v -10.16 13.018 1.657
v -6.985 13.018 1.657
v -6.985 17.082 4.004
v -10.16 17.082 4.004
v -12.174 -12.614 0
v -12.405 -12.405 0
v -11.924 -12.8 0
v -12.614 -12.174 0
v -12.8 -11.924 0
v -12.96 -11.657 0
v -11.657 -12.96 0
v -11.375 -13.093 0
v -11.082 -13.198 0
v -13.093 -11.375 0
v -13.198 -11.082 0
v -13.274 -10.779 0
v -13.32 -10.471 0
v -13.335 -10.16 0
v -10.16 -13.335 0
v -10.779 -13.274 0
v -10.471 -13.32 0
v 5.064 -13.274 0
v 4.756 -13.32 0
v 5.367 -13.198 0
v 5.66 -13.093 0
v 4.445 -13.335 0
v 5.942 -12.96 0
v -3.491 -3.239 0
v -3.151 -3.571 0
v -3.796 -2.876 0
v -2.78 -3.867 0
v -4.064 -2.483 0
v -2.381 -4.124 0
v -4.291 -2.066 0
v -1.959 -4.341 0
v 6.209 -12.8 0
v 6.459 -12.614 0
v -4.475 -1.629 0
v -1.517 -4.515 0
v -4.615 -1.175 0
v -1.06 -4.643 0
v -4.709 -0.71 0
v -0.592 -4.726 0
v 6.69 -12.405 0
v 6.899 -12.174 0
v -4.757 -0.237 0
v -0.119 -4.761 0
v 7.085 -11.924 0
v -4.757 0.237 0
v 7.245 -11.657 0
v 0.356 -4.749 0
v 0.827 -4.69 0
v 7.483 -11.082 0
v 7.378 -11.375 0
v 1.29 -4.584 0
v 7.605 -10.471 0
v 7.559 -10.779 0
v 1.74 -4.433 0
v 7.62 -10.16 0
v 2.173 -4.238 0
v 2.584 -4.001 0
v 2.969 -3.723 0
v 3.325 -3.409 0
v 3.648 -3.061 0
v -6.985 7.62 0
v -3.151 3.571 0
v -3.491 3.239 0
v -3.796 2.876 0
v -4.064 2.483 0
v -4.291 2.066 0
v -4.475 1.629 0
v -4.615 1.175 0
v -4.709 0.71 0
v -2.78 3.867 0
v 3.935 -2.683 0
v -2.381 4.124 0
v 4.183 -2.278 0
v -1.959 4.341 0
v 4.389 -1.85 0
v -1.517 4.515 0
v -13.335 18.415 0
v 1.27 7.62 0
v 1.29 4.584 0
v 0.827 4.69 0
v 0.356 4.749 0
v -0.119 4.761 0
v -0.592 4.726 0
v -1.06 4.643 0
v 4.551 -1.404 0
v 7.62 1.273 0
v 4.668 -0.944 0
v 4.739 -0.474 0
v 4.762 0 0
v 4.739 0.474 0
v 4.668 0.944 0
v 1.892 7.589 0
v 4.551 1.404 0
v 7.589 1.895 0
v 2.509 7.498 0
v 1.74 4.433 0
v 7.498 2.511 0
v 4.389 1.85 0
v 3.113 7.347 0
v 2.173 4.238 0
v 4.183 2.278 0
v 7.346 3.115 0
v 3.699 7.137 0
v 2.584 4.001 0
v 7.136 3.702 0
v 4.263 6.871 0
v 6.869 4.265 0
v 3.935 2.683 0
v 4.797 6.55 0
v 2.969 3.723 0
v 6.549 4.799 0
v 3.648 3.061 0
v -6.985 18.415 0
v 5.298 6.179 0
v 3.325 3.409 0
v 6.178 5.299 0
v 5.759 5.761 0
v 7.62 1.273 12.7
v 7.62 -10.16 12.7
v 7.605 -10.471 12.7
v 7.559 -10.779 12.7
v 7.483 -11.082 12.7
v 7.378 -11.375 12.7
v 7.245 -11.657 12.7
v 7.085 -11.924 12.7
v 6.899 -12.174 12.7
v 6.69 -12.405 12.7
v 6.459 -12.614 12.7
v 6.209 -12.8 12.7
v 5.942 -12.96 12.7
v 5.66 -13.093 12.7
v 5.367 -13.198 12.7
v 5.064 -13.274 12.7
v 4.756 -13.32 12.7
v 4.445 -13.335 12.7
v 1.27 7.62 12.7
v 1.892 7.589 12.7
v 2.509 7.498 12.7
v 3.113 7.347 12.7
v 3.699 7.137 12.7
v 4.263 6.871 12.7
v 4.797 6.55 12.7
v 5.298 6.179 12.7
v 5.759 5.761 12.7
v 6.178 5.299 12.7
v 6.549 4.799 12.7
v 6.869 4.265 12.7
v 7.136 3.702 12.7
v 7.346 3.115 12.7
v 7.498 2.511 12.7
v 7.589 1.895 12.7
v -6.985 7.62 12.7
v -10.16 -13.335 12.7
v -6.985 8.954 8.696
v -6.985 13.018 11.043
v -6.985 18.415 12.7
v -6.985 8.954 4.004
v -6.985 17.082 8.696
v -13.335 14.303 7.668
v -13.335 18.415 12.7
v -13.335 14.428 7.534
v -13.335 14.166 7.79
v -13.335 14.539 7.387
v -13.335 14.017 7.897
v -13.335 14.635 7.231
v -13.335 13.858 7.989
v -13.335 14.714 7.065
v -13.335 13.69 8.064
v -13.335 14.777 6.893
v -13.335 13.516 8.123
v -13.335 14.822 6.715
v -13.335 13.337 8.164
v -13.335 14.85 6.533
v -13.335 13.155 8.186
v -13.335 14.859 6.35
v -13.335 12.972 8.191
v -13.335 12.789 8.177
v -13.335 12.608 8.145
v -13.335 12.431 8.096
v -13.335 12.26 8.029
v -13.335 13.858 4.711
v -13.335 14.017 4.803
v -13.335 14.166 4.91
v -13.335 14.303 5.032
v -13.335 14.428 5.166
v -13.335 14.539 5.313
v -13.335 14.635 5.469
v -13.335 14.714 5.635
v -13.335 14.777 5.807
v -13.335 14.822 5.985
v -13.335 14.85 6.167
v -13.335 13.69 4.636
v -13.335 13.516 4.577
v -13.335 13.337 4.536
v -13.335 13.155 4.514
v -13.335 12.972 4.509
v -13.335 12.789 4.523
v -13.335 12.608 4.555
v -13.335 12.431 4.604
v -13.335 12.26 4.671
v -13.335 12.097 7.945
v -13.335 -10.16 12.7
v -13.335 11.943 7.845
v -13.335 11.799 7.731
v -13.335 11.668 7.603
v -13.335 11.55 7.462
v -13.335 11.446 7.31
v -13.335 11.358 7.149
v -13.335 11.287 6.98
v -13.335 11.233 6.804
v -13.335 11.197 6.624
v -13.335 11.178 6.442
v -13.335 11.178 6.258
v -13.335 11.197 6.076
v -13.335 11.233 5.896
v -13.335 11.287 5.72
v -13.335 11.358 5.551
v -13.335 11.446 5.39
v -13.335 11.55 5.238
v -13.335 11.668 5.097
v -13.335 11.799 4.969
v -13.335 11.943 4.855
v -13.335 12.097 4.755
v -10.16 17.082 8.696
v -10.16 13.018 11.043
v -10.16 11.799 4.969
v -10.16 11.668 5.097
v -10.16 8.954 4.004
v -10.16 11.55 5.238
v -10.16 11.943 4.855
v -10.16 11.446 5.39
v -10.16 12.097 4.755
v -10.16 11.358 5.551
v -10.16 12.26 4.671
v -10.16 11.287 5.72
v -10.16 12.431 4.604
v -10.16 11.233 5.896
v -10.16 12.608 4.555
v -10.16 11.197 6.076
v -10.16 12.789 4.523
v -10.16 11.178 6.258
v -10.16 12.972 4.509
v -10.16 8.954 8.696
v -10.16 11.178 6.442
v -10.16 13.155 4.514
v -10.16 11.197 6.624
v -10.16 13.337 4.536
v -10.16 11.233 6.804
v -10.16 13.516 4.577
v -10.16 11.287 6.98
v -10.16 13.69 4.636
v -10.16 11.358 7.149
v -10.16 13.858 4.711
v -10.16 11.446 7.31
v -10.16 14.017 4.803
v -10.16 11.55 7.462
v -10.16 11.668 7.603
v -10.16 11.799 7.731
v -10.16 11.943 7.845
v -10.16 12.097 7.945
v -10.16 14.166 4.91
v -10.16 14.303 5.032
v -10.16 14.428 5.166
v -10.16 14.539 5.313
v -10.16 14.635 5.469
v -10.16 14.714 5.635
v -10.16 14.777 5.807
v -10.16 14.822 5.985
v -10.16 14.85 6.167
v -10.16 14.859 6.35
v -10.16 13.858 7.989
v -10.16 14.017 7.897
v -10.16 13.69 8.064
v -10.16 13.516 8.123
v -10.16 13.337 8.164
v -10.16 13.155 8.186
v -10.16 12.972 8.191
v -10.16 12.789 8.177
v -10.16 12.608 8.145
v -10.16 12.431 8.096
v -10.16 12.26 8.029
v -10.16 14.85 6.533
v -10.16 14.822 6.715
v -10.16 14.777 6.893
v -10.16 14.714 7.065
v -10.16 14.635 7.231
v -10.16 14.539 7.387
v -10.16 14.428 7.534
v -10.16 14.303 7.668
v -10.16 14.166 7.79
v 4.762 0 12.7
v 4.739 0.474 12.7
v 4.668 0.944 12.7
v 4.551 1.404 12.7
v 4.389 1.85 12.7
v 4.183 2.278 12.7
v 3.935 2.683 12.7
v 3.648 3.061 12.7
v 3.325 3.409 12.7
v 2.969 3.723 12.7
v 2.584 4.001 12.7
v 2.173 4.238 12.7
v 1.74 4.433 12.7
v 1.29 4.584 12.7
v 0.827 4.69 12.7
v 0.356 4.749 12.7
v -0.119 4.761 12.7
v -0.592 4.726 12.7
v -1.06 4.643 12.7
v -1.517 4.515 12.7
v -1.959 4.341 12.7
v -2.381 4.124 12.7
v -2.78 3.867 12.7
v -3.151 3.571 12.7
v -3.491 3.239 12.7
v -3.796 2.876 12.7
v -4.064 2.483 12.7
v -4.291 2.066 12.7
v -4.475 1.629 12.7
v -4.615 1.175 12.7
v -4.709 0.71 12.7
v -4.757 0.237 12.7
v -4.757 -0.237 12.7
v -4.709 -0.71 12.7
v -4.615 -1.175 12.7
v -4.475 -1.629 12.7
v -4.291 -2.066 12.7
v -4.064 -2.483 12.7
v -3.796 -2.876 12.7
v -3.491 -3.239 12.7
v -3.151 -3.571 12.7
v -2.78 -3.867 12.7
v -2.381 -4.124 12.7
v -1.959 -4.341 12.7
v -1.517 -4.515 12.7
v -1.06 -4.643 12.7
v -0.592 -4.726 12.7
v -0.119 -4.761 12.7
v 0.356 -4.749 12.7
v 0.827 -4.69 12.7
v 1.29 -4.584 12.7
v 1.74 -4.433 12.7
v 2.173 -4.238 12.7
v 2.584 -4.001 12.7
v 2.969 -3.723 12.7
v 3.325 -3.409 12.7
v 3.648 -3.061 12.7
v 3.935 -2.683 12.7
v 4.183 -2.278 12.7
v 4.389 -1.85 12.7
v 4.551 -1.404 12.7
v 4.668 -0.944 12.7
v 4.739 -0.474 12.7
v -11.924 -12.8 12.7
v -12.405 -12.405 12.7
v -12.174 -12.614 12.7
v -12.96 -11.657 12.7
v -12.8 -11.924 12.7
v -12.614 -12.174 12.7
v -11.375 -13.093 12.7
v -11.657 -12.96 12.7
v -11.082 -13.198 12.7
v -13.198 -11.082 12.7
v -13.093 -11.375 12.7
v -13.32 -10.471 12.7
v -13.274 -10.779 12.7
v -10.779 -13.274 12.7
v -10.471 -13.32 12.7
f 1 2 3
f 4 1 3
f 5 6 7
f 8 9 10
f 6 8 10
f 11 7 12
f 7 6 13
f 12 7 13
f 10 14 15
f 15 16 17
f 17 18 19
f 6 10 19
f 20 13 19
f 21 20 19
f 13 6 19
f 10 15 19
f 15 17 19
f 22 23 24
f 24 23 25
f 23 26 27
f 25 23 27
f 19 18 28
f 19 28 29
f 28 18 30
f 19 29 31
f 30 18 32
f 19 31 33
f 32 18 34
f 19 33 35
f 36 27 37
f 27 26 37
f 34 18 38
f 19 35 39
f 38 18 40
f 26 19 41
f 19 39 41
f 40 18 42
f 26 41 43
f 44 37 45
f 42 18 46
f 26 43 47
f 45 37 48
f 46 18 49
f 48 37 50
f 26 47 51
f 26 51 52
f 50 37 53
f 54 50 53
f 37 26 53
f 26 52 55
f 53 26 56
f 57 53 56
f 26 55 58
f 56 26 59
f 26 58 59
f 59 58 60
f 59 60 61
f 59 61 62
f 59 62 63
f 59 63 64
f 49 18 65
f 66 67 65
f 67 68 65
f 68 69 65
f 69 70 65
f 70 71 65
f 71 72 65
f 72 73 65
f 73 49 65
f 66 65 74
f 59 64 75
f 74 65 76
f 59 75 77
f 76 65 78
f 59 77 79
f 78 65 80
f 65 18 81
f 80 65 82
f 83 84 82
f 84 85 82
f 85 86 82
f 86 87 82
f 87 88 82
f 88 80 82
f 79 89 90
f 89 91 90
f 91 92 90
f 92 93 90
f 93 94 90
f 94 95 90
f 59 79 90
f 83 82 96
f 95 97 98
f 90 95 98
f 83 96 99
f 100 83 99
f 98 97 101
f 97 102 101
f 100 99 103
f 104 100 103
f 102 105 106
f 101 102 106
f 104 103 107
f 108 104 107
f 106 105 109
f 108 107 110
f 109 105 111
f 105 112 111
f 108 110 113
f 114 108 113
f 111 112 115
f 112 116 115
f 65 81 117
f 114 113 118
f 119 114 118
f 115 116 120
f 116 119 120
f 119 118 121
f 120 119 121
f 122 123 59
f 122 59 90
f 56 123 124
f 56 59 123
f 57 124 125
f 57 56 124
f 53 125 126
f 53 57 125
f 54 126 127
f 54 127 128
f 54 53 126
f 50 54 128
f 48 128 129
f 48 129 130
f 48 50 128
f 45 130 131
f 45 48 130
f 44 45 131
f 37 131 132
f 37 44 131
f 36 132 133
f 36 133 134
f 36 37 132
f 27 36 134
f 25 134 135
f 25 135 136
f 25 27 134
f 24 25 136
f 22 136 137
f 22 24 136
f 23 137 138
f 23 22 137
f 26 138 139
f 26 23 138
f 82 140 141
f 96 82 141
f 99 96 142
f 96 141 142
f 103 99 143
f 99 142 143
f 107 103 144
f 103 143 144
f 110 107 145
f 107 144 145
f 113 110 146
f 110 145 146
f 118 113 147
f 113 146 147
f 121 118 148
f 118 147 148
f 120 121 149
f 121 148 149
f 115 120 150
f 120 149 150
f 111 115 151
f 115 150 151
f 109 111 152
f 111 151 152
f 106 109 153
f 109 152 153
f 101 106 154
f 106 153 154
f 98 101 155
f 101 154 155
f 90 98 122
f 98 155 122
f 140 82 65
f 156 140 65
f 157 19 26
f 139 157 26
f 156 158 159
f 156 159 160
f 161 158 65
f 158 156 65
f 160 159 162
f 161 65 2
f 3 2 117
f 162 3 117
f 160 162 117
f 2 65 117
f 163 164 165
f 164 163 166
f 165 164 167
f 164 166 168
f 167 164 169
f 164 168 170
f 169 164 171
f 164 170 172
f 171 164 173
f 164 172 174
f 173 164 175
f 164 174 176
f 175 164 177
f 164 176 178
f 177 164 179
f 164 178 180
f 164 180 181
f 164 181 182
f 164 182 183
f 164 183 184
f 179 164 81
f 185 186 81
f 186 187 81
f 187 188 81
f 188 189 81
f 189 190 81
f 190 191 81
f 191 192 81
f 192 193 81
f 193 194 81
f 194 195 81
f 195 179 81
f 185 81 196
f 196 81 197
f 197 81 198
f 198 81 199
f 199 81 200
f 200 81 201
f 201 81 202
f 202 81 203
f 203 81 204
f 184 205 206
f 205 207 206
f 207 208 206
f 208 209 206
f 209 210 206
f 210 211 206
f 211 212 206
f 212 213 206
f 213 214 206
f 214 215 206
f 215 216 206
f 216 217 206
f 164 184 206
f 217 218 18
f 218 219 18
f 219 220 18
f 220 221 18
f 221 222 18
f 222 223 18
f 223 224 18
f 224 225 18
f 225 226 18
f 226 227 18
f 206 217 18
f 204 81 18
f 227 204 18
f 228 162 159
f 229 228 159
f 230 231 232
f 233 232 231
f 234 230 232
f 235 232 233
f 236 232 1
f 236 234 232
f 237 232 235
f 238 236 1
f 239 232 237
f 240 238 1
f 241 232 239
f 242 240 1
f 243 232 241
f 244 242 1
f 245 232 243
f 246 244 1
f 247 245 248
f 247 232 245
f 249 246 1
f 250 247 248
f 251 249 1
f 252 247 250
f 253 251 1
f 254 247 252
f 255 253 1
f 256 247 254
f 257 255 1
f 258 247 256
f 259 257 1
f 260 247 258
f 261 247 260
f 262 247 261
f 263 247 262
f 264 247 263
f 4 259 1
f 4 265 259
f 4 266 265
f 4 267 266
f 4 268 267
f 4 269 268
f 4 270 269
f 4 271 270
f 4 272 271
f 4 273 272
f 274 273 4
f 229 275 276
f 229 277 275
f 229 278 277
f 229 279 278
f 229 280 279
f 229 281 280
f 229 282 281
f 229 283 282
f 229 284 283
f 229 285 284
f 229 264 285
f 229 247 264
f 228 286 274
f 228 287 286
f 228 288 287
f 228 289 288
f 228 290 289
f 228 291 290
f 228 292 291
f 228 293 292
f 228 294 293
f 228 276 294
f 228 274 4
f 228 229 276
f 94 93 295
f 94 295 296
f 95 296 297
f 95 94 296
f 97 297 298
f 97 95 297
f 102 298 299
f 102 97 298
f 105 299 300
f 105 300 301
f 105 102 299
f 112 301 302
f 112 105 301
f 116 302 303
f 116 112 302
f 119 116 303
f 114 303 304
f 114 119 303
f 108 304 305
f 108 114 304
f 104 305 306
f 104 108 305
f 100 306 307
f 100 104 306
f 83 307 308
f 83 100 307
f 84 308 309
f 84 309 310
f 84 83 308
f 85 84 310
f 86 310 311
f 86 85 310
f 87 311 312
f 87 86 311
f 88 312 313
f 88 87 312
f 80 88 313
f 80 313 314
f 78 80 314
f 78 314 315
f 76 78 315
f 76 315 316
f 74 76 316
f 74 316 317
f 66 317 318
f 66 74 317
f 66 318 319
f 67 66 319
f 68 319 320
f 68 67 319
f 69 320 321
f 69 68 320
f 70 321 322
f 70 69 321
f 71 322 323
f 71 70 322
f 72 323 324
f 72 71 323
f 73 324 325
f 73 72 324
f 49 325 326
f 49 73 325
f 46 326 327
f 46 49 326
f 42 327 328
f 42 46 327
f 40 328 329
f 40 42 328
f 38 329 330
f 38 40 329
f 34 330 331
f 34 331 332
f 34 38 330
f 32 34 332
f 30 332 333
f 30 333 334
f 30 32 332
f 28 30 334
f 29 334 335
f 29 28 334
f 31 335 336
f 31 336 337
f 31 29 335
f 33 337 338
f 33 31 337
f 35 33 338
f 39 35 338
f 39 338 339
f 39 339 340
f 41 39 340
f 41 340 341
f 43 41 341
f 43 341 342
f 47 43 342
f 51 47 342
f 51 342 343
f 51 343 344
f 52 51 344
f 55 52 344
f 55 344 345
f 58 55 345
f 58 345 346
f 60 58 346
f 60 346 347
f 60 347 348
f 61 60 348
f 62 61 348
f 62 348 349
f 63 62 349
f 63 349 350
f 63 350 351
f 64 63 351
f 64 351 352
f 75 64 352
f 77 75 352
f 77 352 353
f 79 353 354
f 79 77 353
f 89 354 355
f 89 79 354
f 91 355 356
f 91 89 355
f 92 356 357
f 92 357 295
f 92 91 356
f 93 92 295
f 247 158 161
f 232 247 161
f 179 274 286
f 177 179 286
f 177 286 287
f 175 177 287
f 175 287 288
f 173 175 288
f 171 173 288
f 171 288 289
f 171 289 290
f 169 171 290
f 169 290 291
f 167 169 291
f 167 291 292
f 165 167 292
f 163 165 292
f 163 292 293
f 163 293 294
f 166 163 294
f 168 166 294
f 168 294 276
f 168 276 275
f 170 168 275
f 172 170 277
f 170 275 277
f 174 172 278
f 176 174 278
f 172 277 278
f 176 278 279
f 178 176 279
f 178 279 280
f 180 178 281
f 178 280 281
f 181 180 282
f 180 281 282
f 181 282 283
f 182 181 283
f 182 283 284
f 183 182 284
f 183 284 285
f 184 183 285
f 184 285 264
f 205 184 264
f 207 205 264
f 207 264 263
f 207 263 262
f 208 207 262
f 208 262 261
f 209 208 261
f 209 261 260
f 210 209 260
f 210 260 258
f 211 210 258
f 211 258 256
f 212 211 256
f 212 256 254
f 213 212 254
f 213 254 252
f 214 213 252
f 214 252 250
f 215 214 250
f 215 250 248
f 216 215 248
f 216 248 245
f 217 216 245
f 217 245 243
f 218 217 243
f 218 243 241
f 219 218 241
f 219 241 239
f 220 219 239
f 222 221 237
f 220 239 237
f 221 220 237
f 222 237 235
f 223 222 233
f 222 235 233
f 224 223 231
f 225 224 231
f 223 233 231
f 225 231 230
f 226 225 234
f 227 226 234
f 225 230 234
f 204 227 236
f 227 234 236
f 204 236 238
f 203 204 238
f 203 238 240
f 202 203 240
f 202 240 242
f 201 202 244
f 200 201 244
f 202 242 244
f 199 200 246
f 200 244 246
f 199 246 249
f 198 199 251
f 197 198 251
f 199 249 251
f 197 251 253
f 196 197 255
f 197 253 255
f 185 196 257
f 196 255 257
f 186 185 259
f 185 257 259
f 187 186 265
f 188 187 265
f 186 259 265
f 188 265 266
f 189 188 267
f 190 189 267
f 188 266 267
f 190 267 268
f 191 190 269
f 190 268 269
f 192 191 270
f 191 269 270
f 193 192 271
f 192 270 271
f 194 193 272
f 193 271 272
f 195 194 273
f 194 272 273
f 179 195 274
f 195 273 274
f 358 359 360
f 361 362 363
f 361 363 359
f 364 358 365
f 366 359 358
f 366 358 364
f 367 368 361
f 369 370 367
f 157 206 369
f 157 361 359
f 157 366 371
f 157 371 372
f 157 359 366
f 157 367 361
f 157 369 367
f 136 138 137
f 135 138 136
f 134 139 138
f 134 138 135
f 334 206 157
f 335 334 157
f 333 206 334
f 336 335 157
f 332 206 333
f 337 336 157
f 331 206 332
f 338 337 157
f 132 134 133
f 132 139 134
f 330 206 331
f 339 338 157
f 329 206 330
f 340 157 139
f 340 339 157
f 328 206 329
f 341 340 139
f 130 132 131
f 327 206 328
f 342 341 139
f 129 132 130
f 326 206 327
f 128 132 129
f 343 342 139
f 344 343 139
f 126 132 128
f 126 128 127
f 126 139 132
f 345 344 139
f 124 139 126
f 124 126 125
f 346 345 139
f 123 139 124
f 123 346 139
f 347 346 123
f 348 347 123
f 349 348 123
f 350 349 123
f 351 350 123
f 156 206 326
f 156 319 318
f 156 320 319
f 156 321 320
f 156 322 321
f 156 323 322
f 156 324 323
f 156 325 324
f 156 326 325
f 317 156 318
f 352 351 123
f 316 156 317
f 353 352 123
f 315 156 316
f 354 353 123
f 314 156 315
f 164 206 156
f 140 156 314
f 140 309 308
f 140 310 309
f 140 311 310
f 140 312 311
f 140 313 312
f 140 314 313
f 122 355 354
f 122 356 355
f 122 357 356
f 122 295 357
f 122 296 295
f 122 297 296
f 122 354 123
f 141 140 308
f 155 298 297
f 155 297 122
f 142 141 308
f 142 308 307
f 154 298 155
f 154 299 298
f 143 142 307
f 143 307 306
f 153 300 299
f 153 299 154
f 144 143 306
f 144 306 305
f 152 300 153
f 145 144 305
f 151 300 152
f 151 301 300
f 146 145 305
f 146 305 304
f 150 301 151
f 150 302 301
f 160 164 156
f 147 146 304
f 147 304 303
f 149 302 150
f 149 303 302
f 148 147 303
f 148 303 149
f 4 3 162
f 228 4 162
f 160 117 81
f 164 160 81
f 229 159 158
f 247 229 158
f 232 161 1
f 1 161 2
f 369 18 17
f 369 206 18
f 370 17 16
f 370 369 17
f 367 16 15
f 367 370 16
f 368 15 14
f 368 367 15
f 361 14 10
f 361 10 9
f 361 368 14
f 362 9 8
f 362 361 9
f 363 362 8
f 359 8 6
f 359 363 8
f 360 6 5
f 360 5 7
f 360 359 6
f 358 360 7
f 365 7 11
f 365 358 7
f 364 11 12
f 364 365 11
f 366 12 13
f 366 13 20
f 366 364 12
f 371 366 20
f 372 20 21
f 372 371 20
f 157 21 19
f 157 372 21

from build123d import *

# Parameters (mm, degrees)
F0_R      = 4.7625
F1_DEPTH  = 12.7
F2_R      = 6.35
F3_R      = 3.175
F4_R      = 1.8415
F5_DEPTH  = 25.4
F7_DEPTH  = 3.175
F8_R      = 1.8415
F9_DEPTH  = 25.4
F11_DEPTH = 3.175
F12_W     = 20.617577
F12_H     = 29.730969
F13_DEPTH = 25.4
F14_R     = 3.175


with BuildPart() as f1:
    # F0 (on Top) → F1 (new body)
    with BuildSketch(Plane.XY):
        Polygon((-13.335, 18.415), (-13.335, -13.335), (18.415, -13.335), (18.415, -6.985), (7.62, -6.985), (7.62, 7.62), (-6.985, 7.62), (-6.985, 18.415), align=None)
        Circle(F0_R, mode=Mode.SUBTRACT)
    extrude(amount=F1_DEPTH)

    # F2
    f2_edges = [f1.edges().sort_by_distance(p)[0] for p in [
        (7.62, 7.62, 6.35),
    ]]
    fillet(f2_edges, radius=F2_R)

    # F3
    f3_edges = [f1.edges().sort_by_distance(p)[0] for p in [
        (-13.335, -13.335, 6.35),
    ]]
    fillet(f3_edges, radius=F3_R)

    # F4 (on face) → F5 (cut)
    with BuildSketch(Plane(origin=(0, -6.985, 0), x_dir=(-1, 0, 0), z_dir=(0, 1, 0))):
        with Locations((-13.0175, 6.35)):
            Circle(F4_R)
    extrude(amount=-F5_DEPTH, mode=Mode.SUBTRACT)

    # F6 (on face) → F7 (cut)
    with BuildSketch(Plane(origin=(0, -6.985, 0), x_dir=(-1, 0, 0), z_dir=(0, 1, 0))):
        Polygon((-17.0815, 4.003649), (-13.0175, 1.657297), (-8.9535, 4.003649), (-8.9535, 8.696351), (-13.0175, 11.042703), (-17.0815, 8.696351), align=None)
    extrude(amount=-F7_DEPTH, mode=Mode.SUBTRACT)

    # F8 (on face) → F9 (cut)
    with BuildSketch(Plane.YZ.offset(-6.985)):
        with Locations((13.0175, 6.35)):
            Circle(F8_R)
    extrude(amount=-F9_DEPTH, mode=Mode.SUBTRACT)

    # F10 (on face) → F11 (cut)
    with BuildSketch(Plane.YZ.offset(-6.985)):
        Polygon((8.9535, 8.696351), (8.9535, 4.003649), (13.0175, 1.657297), (17.0815, 4.003649), (17.0815, 8.696351), (13.0175, 11.042703), align=None)
    extrude(amount=-F11_DEPTH, mode=Mode.SUBTRACT)

    # F12 (on face) → F13 (cut)
    with BuildSketch(Plane.XY.offset(12.7)):
        with Locations((17.928788, -6.337149)):
            Rectangle(F12_W, F12_H)
    extrude(amount=-F13_DEPTH, mode=Mode.SUBTRACT)

    # F14
    f14_edges = [f1.edges().sort_by_distance(p)[0] for p in [
        (7.62, -13.335, 6.35),
    ]]
    fillet(f14_edges, radius=F14_R)


solid = f1.part
